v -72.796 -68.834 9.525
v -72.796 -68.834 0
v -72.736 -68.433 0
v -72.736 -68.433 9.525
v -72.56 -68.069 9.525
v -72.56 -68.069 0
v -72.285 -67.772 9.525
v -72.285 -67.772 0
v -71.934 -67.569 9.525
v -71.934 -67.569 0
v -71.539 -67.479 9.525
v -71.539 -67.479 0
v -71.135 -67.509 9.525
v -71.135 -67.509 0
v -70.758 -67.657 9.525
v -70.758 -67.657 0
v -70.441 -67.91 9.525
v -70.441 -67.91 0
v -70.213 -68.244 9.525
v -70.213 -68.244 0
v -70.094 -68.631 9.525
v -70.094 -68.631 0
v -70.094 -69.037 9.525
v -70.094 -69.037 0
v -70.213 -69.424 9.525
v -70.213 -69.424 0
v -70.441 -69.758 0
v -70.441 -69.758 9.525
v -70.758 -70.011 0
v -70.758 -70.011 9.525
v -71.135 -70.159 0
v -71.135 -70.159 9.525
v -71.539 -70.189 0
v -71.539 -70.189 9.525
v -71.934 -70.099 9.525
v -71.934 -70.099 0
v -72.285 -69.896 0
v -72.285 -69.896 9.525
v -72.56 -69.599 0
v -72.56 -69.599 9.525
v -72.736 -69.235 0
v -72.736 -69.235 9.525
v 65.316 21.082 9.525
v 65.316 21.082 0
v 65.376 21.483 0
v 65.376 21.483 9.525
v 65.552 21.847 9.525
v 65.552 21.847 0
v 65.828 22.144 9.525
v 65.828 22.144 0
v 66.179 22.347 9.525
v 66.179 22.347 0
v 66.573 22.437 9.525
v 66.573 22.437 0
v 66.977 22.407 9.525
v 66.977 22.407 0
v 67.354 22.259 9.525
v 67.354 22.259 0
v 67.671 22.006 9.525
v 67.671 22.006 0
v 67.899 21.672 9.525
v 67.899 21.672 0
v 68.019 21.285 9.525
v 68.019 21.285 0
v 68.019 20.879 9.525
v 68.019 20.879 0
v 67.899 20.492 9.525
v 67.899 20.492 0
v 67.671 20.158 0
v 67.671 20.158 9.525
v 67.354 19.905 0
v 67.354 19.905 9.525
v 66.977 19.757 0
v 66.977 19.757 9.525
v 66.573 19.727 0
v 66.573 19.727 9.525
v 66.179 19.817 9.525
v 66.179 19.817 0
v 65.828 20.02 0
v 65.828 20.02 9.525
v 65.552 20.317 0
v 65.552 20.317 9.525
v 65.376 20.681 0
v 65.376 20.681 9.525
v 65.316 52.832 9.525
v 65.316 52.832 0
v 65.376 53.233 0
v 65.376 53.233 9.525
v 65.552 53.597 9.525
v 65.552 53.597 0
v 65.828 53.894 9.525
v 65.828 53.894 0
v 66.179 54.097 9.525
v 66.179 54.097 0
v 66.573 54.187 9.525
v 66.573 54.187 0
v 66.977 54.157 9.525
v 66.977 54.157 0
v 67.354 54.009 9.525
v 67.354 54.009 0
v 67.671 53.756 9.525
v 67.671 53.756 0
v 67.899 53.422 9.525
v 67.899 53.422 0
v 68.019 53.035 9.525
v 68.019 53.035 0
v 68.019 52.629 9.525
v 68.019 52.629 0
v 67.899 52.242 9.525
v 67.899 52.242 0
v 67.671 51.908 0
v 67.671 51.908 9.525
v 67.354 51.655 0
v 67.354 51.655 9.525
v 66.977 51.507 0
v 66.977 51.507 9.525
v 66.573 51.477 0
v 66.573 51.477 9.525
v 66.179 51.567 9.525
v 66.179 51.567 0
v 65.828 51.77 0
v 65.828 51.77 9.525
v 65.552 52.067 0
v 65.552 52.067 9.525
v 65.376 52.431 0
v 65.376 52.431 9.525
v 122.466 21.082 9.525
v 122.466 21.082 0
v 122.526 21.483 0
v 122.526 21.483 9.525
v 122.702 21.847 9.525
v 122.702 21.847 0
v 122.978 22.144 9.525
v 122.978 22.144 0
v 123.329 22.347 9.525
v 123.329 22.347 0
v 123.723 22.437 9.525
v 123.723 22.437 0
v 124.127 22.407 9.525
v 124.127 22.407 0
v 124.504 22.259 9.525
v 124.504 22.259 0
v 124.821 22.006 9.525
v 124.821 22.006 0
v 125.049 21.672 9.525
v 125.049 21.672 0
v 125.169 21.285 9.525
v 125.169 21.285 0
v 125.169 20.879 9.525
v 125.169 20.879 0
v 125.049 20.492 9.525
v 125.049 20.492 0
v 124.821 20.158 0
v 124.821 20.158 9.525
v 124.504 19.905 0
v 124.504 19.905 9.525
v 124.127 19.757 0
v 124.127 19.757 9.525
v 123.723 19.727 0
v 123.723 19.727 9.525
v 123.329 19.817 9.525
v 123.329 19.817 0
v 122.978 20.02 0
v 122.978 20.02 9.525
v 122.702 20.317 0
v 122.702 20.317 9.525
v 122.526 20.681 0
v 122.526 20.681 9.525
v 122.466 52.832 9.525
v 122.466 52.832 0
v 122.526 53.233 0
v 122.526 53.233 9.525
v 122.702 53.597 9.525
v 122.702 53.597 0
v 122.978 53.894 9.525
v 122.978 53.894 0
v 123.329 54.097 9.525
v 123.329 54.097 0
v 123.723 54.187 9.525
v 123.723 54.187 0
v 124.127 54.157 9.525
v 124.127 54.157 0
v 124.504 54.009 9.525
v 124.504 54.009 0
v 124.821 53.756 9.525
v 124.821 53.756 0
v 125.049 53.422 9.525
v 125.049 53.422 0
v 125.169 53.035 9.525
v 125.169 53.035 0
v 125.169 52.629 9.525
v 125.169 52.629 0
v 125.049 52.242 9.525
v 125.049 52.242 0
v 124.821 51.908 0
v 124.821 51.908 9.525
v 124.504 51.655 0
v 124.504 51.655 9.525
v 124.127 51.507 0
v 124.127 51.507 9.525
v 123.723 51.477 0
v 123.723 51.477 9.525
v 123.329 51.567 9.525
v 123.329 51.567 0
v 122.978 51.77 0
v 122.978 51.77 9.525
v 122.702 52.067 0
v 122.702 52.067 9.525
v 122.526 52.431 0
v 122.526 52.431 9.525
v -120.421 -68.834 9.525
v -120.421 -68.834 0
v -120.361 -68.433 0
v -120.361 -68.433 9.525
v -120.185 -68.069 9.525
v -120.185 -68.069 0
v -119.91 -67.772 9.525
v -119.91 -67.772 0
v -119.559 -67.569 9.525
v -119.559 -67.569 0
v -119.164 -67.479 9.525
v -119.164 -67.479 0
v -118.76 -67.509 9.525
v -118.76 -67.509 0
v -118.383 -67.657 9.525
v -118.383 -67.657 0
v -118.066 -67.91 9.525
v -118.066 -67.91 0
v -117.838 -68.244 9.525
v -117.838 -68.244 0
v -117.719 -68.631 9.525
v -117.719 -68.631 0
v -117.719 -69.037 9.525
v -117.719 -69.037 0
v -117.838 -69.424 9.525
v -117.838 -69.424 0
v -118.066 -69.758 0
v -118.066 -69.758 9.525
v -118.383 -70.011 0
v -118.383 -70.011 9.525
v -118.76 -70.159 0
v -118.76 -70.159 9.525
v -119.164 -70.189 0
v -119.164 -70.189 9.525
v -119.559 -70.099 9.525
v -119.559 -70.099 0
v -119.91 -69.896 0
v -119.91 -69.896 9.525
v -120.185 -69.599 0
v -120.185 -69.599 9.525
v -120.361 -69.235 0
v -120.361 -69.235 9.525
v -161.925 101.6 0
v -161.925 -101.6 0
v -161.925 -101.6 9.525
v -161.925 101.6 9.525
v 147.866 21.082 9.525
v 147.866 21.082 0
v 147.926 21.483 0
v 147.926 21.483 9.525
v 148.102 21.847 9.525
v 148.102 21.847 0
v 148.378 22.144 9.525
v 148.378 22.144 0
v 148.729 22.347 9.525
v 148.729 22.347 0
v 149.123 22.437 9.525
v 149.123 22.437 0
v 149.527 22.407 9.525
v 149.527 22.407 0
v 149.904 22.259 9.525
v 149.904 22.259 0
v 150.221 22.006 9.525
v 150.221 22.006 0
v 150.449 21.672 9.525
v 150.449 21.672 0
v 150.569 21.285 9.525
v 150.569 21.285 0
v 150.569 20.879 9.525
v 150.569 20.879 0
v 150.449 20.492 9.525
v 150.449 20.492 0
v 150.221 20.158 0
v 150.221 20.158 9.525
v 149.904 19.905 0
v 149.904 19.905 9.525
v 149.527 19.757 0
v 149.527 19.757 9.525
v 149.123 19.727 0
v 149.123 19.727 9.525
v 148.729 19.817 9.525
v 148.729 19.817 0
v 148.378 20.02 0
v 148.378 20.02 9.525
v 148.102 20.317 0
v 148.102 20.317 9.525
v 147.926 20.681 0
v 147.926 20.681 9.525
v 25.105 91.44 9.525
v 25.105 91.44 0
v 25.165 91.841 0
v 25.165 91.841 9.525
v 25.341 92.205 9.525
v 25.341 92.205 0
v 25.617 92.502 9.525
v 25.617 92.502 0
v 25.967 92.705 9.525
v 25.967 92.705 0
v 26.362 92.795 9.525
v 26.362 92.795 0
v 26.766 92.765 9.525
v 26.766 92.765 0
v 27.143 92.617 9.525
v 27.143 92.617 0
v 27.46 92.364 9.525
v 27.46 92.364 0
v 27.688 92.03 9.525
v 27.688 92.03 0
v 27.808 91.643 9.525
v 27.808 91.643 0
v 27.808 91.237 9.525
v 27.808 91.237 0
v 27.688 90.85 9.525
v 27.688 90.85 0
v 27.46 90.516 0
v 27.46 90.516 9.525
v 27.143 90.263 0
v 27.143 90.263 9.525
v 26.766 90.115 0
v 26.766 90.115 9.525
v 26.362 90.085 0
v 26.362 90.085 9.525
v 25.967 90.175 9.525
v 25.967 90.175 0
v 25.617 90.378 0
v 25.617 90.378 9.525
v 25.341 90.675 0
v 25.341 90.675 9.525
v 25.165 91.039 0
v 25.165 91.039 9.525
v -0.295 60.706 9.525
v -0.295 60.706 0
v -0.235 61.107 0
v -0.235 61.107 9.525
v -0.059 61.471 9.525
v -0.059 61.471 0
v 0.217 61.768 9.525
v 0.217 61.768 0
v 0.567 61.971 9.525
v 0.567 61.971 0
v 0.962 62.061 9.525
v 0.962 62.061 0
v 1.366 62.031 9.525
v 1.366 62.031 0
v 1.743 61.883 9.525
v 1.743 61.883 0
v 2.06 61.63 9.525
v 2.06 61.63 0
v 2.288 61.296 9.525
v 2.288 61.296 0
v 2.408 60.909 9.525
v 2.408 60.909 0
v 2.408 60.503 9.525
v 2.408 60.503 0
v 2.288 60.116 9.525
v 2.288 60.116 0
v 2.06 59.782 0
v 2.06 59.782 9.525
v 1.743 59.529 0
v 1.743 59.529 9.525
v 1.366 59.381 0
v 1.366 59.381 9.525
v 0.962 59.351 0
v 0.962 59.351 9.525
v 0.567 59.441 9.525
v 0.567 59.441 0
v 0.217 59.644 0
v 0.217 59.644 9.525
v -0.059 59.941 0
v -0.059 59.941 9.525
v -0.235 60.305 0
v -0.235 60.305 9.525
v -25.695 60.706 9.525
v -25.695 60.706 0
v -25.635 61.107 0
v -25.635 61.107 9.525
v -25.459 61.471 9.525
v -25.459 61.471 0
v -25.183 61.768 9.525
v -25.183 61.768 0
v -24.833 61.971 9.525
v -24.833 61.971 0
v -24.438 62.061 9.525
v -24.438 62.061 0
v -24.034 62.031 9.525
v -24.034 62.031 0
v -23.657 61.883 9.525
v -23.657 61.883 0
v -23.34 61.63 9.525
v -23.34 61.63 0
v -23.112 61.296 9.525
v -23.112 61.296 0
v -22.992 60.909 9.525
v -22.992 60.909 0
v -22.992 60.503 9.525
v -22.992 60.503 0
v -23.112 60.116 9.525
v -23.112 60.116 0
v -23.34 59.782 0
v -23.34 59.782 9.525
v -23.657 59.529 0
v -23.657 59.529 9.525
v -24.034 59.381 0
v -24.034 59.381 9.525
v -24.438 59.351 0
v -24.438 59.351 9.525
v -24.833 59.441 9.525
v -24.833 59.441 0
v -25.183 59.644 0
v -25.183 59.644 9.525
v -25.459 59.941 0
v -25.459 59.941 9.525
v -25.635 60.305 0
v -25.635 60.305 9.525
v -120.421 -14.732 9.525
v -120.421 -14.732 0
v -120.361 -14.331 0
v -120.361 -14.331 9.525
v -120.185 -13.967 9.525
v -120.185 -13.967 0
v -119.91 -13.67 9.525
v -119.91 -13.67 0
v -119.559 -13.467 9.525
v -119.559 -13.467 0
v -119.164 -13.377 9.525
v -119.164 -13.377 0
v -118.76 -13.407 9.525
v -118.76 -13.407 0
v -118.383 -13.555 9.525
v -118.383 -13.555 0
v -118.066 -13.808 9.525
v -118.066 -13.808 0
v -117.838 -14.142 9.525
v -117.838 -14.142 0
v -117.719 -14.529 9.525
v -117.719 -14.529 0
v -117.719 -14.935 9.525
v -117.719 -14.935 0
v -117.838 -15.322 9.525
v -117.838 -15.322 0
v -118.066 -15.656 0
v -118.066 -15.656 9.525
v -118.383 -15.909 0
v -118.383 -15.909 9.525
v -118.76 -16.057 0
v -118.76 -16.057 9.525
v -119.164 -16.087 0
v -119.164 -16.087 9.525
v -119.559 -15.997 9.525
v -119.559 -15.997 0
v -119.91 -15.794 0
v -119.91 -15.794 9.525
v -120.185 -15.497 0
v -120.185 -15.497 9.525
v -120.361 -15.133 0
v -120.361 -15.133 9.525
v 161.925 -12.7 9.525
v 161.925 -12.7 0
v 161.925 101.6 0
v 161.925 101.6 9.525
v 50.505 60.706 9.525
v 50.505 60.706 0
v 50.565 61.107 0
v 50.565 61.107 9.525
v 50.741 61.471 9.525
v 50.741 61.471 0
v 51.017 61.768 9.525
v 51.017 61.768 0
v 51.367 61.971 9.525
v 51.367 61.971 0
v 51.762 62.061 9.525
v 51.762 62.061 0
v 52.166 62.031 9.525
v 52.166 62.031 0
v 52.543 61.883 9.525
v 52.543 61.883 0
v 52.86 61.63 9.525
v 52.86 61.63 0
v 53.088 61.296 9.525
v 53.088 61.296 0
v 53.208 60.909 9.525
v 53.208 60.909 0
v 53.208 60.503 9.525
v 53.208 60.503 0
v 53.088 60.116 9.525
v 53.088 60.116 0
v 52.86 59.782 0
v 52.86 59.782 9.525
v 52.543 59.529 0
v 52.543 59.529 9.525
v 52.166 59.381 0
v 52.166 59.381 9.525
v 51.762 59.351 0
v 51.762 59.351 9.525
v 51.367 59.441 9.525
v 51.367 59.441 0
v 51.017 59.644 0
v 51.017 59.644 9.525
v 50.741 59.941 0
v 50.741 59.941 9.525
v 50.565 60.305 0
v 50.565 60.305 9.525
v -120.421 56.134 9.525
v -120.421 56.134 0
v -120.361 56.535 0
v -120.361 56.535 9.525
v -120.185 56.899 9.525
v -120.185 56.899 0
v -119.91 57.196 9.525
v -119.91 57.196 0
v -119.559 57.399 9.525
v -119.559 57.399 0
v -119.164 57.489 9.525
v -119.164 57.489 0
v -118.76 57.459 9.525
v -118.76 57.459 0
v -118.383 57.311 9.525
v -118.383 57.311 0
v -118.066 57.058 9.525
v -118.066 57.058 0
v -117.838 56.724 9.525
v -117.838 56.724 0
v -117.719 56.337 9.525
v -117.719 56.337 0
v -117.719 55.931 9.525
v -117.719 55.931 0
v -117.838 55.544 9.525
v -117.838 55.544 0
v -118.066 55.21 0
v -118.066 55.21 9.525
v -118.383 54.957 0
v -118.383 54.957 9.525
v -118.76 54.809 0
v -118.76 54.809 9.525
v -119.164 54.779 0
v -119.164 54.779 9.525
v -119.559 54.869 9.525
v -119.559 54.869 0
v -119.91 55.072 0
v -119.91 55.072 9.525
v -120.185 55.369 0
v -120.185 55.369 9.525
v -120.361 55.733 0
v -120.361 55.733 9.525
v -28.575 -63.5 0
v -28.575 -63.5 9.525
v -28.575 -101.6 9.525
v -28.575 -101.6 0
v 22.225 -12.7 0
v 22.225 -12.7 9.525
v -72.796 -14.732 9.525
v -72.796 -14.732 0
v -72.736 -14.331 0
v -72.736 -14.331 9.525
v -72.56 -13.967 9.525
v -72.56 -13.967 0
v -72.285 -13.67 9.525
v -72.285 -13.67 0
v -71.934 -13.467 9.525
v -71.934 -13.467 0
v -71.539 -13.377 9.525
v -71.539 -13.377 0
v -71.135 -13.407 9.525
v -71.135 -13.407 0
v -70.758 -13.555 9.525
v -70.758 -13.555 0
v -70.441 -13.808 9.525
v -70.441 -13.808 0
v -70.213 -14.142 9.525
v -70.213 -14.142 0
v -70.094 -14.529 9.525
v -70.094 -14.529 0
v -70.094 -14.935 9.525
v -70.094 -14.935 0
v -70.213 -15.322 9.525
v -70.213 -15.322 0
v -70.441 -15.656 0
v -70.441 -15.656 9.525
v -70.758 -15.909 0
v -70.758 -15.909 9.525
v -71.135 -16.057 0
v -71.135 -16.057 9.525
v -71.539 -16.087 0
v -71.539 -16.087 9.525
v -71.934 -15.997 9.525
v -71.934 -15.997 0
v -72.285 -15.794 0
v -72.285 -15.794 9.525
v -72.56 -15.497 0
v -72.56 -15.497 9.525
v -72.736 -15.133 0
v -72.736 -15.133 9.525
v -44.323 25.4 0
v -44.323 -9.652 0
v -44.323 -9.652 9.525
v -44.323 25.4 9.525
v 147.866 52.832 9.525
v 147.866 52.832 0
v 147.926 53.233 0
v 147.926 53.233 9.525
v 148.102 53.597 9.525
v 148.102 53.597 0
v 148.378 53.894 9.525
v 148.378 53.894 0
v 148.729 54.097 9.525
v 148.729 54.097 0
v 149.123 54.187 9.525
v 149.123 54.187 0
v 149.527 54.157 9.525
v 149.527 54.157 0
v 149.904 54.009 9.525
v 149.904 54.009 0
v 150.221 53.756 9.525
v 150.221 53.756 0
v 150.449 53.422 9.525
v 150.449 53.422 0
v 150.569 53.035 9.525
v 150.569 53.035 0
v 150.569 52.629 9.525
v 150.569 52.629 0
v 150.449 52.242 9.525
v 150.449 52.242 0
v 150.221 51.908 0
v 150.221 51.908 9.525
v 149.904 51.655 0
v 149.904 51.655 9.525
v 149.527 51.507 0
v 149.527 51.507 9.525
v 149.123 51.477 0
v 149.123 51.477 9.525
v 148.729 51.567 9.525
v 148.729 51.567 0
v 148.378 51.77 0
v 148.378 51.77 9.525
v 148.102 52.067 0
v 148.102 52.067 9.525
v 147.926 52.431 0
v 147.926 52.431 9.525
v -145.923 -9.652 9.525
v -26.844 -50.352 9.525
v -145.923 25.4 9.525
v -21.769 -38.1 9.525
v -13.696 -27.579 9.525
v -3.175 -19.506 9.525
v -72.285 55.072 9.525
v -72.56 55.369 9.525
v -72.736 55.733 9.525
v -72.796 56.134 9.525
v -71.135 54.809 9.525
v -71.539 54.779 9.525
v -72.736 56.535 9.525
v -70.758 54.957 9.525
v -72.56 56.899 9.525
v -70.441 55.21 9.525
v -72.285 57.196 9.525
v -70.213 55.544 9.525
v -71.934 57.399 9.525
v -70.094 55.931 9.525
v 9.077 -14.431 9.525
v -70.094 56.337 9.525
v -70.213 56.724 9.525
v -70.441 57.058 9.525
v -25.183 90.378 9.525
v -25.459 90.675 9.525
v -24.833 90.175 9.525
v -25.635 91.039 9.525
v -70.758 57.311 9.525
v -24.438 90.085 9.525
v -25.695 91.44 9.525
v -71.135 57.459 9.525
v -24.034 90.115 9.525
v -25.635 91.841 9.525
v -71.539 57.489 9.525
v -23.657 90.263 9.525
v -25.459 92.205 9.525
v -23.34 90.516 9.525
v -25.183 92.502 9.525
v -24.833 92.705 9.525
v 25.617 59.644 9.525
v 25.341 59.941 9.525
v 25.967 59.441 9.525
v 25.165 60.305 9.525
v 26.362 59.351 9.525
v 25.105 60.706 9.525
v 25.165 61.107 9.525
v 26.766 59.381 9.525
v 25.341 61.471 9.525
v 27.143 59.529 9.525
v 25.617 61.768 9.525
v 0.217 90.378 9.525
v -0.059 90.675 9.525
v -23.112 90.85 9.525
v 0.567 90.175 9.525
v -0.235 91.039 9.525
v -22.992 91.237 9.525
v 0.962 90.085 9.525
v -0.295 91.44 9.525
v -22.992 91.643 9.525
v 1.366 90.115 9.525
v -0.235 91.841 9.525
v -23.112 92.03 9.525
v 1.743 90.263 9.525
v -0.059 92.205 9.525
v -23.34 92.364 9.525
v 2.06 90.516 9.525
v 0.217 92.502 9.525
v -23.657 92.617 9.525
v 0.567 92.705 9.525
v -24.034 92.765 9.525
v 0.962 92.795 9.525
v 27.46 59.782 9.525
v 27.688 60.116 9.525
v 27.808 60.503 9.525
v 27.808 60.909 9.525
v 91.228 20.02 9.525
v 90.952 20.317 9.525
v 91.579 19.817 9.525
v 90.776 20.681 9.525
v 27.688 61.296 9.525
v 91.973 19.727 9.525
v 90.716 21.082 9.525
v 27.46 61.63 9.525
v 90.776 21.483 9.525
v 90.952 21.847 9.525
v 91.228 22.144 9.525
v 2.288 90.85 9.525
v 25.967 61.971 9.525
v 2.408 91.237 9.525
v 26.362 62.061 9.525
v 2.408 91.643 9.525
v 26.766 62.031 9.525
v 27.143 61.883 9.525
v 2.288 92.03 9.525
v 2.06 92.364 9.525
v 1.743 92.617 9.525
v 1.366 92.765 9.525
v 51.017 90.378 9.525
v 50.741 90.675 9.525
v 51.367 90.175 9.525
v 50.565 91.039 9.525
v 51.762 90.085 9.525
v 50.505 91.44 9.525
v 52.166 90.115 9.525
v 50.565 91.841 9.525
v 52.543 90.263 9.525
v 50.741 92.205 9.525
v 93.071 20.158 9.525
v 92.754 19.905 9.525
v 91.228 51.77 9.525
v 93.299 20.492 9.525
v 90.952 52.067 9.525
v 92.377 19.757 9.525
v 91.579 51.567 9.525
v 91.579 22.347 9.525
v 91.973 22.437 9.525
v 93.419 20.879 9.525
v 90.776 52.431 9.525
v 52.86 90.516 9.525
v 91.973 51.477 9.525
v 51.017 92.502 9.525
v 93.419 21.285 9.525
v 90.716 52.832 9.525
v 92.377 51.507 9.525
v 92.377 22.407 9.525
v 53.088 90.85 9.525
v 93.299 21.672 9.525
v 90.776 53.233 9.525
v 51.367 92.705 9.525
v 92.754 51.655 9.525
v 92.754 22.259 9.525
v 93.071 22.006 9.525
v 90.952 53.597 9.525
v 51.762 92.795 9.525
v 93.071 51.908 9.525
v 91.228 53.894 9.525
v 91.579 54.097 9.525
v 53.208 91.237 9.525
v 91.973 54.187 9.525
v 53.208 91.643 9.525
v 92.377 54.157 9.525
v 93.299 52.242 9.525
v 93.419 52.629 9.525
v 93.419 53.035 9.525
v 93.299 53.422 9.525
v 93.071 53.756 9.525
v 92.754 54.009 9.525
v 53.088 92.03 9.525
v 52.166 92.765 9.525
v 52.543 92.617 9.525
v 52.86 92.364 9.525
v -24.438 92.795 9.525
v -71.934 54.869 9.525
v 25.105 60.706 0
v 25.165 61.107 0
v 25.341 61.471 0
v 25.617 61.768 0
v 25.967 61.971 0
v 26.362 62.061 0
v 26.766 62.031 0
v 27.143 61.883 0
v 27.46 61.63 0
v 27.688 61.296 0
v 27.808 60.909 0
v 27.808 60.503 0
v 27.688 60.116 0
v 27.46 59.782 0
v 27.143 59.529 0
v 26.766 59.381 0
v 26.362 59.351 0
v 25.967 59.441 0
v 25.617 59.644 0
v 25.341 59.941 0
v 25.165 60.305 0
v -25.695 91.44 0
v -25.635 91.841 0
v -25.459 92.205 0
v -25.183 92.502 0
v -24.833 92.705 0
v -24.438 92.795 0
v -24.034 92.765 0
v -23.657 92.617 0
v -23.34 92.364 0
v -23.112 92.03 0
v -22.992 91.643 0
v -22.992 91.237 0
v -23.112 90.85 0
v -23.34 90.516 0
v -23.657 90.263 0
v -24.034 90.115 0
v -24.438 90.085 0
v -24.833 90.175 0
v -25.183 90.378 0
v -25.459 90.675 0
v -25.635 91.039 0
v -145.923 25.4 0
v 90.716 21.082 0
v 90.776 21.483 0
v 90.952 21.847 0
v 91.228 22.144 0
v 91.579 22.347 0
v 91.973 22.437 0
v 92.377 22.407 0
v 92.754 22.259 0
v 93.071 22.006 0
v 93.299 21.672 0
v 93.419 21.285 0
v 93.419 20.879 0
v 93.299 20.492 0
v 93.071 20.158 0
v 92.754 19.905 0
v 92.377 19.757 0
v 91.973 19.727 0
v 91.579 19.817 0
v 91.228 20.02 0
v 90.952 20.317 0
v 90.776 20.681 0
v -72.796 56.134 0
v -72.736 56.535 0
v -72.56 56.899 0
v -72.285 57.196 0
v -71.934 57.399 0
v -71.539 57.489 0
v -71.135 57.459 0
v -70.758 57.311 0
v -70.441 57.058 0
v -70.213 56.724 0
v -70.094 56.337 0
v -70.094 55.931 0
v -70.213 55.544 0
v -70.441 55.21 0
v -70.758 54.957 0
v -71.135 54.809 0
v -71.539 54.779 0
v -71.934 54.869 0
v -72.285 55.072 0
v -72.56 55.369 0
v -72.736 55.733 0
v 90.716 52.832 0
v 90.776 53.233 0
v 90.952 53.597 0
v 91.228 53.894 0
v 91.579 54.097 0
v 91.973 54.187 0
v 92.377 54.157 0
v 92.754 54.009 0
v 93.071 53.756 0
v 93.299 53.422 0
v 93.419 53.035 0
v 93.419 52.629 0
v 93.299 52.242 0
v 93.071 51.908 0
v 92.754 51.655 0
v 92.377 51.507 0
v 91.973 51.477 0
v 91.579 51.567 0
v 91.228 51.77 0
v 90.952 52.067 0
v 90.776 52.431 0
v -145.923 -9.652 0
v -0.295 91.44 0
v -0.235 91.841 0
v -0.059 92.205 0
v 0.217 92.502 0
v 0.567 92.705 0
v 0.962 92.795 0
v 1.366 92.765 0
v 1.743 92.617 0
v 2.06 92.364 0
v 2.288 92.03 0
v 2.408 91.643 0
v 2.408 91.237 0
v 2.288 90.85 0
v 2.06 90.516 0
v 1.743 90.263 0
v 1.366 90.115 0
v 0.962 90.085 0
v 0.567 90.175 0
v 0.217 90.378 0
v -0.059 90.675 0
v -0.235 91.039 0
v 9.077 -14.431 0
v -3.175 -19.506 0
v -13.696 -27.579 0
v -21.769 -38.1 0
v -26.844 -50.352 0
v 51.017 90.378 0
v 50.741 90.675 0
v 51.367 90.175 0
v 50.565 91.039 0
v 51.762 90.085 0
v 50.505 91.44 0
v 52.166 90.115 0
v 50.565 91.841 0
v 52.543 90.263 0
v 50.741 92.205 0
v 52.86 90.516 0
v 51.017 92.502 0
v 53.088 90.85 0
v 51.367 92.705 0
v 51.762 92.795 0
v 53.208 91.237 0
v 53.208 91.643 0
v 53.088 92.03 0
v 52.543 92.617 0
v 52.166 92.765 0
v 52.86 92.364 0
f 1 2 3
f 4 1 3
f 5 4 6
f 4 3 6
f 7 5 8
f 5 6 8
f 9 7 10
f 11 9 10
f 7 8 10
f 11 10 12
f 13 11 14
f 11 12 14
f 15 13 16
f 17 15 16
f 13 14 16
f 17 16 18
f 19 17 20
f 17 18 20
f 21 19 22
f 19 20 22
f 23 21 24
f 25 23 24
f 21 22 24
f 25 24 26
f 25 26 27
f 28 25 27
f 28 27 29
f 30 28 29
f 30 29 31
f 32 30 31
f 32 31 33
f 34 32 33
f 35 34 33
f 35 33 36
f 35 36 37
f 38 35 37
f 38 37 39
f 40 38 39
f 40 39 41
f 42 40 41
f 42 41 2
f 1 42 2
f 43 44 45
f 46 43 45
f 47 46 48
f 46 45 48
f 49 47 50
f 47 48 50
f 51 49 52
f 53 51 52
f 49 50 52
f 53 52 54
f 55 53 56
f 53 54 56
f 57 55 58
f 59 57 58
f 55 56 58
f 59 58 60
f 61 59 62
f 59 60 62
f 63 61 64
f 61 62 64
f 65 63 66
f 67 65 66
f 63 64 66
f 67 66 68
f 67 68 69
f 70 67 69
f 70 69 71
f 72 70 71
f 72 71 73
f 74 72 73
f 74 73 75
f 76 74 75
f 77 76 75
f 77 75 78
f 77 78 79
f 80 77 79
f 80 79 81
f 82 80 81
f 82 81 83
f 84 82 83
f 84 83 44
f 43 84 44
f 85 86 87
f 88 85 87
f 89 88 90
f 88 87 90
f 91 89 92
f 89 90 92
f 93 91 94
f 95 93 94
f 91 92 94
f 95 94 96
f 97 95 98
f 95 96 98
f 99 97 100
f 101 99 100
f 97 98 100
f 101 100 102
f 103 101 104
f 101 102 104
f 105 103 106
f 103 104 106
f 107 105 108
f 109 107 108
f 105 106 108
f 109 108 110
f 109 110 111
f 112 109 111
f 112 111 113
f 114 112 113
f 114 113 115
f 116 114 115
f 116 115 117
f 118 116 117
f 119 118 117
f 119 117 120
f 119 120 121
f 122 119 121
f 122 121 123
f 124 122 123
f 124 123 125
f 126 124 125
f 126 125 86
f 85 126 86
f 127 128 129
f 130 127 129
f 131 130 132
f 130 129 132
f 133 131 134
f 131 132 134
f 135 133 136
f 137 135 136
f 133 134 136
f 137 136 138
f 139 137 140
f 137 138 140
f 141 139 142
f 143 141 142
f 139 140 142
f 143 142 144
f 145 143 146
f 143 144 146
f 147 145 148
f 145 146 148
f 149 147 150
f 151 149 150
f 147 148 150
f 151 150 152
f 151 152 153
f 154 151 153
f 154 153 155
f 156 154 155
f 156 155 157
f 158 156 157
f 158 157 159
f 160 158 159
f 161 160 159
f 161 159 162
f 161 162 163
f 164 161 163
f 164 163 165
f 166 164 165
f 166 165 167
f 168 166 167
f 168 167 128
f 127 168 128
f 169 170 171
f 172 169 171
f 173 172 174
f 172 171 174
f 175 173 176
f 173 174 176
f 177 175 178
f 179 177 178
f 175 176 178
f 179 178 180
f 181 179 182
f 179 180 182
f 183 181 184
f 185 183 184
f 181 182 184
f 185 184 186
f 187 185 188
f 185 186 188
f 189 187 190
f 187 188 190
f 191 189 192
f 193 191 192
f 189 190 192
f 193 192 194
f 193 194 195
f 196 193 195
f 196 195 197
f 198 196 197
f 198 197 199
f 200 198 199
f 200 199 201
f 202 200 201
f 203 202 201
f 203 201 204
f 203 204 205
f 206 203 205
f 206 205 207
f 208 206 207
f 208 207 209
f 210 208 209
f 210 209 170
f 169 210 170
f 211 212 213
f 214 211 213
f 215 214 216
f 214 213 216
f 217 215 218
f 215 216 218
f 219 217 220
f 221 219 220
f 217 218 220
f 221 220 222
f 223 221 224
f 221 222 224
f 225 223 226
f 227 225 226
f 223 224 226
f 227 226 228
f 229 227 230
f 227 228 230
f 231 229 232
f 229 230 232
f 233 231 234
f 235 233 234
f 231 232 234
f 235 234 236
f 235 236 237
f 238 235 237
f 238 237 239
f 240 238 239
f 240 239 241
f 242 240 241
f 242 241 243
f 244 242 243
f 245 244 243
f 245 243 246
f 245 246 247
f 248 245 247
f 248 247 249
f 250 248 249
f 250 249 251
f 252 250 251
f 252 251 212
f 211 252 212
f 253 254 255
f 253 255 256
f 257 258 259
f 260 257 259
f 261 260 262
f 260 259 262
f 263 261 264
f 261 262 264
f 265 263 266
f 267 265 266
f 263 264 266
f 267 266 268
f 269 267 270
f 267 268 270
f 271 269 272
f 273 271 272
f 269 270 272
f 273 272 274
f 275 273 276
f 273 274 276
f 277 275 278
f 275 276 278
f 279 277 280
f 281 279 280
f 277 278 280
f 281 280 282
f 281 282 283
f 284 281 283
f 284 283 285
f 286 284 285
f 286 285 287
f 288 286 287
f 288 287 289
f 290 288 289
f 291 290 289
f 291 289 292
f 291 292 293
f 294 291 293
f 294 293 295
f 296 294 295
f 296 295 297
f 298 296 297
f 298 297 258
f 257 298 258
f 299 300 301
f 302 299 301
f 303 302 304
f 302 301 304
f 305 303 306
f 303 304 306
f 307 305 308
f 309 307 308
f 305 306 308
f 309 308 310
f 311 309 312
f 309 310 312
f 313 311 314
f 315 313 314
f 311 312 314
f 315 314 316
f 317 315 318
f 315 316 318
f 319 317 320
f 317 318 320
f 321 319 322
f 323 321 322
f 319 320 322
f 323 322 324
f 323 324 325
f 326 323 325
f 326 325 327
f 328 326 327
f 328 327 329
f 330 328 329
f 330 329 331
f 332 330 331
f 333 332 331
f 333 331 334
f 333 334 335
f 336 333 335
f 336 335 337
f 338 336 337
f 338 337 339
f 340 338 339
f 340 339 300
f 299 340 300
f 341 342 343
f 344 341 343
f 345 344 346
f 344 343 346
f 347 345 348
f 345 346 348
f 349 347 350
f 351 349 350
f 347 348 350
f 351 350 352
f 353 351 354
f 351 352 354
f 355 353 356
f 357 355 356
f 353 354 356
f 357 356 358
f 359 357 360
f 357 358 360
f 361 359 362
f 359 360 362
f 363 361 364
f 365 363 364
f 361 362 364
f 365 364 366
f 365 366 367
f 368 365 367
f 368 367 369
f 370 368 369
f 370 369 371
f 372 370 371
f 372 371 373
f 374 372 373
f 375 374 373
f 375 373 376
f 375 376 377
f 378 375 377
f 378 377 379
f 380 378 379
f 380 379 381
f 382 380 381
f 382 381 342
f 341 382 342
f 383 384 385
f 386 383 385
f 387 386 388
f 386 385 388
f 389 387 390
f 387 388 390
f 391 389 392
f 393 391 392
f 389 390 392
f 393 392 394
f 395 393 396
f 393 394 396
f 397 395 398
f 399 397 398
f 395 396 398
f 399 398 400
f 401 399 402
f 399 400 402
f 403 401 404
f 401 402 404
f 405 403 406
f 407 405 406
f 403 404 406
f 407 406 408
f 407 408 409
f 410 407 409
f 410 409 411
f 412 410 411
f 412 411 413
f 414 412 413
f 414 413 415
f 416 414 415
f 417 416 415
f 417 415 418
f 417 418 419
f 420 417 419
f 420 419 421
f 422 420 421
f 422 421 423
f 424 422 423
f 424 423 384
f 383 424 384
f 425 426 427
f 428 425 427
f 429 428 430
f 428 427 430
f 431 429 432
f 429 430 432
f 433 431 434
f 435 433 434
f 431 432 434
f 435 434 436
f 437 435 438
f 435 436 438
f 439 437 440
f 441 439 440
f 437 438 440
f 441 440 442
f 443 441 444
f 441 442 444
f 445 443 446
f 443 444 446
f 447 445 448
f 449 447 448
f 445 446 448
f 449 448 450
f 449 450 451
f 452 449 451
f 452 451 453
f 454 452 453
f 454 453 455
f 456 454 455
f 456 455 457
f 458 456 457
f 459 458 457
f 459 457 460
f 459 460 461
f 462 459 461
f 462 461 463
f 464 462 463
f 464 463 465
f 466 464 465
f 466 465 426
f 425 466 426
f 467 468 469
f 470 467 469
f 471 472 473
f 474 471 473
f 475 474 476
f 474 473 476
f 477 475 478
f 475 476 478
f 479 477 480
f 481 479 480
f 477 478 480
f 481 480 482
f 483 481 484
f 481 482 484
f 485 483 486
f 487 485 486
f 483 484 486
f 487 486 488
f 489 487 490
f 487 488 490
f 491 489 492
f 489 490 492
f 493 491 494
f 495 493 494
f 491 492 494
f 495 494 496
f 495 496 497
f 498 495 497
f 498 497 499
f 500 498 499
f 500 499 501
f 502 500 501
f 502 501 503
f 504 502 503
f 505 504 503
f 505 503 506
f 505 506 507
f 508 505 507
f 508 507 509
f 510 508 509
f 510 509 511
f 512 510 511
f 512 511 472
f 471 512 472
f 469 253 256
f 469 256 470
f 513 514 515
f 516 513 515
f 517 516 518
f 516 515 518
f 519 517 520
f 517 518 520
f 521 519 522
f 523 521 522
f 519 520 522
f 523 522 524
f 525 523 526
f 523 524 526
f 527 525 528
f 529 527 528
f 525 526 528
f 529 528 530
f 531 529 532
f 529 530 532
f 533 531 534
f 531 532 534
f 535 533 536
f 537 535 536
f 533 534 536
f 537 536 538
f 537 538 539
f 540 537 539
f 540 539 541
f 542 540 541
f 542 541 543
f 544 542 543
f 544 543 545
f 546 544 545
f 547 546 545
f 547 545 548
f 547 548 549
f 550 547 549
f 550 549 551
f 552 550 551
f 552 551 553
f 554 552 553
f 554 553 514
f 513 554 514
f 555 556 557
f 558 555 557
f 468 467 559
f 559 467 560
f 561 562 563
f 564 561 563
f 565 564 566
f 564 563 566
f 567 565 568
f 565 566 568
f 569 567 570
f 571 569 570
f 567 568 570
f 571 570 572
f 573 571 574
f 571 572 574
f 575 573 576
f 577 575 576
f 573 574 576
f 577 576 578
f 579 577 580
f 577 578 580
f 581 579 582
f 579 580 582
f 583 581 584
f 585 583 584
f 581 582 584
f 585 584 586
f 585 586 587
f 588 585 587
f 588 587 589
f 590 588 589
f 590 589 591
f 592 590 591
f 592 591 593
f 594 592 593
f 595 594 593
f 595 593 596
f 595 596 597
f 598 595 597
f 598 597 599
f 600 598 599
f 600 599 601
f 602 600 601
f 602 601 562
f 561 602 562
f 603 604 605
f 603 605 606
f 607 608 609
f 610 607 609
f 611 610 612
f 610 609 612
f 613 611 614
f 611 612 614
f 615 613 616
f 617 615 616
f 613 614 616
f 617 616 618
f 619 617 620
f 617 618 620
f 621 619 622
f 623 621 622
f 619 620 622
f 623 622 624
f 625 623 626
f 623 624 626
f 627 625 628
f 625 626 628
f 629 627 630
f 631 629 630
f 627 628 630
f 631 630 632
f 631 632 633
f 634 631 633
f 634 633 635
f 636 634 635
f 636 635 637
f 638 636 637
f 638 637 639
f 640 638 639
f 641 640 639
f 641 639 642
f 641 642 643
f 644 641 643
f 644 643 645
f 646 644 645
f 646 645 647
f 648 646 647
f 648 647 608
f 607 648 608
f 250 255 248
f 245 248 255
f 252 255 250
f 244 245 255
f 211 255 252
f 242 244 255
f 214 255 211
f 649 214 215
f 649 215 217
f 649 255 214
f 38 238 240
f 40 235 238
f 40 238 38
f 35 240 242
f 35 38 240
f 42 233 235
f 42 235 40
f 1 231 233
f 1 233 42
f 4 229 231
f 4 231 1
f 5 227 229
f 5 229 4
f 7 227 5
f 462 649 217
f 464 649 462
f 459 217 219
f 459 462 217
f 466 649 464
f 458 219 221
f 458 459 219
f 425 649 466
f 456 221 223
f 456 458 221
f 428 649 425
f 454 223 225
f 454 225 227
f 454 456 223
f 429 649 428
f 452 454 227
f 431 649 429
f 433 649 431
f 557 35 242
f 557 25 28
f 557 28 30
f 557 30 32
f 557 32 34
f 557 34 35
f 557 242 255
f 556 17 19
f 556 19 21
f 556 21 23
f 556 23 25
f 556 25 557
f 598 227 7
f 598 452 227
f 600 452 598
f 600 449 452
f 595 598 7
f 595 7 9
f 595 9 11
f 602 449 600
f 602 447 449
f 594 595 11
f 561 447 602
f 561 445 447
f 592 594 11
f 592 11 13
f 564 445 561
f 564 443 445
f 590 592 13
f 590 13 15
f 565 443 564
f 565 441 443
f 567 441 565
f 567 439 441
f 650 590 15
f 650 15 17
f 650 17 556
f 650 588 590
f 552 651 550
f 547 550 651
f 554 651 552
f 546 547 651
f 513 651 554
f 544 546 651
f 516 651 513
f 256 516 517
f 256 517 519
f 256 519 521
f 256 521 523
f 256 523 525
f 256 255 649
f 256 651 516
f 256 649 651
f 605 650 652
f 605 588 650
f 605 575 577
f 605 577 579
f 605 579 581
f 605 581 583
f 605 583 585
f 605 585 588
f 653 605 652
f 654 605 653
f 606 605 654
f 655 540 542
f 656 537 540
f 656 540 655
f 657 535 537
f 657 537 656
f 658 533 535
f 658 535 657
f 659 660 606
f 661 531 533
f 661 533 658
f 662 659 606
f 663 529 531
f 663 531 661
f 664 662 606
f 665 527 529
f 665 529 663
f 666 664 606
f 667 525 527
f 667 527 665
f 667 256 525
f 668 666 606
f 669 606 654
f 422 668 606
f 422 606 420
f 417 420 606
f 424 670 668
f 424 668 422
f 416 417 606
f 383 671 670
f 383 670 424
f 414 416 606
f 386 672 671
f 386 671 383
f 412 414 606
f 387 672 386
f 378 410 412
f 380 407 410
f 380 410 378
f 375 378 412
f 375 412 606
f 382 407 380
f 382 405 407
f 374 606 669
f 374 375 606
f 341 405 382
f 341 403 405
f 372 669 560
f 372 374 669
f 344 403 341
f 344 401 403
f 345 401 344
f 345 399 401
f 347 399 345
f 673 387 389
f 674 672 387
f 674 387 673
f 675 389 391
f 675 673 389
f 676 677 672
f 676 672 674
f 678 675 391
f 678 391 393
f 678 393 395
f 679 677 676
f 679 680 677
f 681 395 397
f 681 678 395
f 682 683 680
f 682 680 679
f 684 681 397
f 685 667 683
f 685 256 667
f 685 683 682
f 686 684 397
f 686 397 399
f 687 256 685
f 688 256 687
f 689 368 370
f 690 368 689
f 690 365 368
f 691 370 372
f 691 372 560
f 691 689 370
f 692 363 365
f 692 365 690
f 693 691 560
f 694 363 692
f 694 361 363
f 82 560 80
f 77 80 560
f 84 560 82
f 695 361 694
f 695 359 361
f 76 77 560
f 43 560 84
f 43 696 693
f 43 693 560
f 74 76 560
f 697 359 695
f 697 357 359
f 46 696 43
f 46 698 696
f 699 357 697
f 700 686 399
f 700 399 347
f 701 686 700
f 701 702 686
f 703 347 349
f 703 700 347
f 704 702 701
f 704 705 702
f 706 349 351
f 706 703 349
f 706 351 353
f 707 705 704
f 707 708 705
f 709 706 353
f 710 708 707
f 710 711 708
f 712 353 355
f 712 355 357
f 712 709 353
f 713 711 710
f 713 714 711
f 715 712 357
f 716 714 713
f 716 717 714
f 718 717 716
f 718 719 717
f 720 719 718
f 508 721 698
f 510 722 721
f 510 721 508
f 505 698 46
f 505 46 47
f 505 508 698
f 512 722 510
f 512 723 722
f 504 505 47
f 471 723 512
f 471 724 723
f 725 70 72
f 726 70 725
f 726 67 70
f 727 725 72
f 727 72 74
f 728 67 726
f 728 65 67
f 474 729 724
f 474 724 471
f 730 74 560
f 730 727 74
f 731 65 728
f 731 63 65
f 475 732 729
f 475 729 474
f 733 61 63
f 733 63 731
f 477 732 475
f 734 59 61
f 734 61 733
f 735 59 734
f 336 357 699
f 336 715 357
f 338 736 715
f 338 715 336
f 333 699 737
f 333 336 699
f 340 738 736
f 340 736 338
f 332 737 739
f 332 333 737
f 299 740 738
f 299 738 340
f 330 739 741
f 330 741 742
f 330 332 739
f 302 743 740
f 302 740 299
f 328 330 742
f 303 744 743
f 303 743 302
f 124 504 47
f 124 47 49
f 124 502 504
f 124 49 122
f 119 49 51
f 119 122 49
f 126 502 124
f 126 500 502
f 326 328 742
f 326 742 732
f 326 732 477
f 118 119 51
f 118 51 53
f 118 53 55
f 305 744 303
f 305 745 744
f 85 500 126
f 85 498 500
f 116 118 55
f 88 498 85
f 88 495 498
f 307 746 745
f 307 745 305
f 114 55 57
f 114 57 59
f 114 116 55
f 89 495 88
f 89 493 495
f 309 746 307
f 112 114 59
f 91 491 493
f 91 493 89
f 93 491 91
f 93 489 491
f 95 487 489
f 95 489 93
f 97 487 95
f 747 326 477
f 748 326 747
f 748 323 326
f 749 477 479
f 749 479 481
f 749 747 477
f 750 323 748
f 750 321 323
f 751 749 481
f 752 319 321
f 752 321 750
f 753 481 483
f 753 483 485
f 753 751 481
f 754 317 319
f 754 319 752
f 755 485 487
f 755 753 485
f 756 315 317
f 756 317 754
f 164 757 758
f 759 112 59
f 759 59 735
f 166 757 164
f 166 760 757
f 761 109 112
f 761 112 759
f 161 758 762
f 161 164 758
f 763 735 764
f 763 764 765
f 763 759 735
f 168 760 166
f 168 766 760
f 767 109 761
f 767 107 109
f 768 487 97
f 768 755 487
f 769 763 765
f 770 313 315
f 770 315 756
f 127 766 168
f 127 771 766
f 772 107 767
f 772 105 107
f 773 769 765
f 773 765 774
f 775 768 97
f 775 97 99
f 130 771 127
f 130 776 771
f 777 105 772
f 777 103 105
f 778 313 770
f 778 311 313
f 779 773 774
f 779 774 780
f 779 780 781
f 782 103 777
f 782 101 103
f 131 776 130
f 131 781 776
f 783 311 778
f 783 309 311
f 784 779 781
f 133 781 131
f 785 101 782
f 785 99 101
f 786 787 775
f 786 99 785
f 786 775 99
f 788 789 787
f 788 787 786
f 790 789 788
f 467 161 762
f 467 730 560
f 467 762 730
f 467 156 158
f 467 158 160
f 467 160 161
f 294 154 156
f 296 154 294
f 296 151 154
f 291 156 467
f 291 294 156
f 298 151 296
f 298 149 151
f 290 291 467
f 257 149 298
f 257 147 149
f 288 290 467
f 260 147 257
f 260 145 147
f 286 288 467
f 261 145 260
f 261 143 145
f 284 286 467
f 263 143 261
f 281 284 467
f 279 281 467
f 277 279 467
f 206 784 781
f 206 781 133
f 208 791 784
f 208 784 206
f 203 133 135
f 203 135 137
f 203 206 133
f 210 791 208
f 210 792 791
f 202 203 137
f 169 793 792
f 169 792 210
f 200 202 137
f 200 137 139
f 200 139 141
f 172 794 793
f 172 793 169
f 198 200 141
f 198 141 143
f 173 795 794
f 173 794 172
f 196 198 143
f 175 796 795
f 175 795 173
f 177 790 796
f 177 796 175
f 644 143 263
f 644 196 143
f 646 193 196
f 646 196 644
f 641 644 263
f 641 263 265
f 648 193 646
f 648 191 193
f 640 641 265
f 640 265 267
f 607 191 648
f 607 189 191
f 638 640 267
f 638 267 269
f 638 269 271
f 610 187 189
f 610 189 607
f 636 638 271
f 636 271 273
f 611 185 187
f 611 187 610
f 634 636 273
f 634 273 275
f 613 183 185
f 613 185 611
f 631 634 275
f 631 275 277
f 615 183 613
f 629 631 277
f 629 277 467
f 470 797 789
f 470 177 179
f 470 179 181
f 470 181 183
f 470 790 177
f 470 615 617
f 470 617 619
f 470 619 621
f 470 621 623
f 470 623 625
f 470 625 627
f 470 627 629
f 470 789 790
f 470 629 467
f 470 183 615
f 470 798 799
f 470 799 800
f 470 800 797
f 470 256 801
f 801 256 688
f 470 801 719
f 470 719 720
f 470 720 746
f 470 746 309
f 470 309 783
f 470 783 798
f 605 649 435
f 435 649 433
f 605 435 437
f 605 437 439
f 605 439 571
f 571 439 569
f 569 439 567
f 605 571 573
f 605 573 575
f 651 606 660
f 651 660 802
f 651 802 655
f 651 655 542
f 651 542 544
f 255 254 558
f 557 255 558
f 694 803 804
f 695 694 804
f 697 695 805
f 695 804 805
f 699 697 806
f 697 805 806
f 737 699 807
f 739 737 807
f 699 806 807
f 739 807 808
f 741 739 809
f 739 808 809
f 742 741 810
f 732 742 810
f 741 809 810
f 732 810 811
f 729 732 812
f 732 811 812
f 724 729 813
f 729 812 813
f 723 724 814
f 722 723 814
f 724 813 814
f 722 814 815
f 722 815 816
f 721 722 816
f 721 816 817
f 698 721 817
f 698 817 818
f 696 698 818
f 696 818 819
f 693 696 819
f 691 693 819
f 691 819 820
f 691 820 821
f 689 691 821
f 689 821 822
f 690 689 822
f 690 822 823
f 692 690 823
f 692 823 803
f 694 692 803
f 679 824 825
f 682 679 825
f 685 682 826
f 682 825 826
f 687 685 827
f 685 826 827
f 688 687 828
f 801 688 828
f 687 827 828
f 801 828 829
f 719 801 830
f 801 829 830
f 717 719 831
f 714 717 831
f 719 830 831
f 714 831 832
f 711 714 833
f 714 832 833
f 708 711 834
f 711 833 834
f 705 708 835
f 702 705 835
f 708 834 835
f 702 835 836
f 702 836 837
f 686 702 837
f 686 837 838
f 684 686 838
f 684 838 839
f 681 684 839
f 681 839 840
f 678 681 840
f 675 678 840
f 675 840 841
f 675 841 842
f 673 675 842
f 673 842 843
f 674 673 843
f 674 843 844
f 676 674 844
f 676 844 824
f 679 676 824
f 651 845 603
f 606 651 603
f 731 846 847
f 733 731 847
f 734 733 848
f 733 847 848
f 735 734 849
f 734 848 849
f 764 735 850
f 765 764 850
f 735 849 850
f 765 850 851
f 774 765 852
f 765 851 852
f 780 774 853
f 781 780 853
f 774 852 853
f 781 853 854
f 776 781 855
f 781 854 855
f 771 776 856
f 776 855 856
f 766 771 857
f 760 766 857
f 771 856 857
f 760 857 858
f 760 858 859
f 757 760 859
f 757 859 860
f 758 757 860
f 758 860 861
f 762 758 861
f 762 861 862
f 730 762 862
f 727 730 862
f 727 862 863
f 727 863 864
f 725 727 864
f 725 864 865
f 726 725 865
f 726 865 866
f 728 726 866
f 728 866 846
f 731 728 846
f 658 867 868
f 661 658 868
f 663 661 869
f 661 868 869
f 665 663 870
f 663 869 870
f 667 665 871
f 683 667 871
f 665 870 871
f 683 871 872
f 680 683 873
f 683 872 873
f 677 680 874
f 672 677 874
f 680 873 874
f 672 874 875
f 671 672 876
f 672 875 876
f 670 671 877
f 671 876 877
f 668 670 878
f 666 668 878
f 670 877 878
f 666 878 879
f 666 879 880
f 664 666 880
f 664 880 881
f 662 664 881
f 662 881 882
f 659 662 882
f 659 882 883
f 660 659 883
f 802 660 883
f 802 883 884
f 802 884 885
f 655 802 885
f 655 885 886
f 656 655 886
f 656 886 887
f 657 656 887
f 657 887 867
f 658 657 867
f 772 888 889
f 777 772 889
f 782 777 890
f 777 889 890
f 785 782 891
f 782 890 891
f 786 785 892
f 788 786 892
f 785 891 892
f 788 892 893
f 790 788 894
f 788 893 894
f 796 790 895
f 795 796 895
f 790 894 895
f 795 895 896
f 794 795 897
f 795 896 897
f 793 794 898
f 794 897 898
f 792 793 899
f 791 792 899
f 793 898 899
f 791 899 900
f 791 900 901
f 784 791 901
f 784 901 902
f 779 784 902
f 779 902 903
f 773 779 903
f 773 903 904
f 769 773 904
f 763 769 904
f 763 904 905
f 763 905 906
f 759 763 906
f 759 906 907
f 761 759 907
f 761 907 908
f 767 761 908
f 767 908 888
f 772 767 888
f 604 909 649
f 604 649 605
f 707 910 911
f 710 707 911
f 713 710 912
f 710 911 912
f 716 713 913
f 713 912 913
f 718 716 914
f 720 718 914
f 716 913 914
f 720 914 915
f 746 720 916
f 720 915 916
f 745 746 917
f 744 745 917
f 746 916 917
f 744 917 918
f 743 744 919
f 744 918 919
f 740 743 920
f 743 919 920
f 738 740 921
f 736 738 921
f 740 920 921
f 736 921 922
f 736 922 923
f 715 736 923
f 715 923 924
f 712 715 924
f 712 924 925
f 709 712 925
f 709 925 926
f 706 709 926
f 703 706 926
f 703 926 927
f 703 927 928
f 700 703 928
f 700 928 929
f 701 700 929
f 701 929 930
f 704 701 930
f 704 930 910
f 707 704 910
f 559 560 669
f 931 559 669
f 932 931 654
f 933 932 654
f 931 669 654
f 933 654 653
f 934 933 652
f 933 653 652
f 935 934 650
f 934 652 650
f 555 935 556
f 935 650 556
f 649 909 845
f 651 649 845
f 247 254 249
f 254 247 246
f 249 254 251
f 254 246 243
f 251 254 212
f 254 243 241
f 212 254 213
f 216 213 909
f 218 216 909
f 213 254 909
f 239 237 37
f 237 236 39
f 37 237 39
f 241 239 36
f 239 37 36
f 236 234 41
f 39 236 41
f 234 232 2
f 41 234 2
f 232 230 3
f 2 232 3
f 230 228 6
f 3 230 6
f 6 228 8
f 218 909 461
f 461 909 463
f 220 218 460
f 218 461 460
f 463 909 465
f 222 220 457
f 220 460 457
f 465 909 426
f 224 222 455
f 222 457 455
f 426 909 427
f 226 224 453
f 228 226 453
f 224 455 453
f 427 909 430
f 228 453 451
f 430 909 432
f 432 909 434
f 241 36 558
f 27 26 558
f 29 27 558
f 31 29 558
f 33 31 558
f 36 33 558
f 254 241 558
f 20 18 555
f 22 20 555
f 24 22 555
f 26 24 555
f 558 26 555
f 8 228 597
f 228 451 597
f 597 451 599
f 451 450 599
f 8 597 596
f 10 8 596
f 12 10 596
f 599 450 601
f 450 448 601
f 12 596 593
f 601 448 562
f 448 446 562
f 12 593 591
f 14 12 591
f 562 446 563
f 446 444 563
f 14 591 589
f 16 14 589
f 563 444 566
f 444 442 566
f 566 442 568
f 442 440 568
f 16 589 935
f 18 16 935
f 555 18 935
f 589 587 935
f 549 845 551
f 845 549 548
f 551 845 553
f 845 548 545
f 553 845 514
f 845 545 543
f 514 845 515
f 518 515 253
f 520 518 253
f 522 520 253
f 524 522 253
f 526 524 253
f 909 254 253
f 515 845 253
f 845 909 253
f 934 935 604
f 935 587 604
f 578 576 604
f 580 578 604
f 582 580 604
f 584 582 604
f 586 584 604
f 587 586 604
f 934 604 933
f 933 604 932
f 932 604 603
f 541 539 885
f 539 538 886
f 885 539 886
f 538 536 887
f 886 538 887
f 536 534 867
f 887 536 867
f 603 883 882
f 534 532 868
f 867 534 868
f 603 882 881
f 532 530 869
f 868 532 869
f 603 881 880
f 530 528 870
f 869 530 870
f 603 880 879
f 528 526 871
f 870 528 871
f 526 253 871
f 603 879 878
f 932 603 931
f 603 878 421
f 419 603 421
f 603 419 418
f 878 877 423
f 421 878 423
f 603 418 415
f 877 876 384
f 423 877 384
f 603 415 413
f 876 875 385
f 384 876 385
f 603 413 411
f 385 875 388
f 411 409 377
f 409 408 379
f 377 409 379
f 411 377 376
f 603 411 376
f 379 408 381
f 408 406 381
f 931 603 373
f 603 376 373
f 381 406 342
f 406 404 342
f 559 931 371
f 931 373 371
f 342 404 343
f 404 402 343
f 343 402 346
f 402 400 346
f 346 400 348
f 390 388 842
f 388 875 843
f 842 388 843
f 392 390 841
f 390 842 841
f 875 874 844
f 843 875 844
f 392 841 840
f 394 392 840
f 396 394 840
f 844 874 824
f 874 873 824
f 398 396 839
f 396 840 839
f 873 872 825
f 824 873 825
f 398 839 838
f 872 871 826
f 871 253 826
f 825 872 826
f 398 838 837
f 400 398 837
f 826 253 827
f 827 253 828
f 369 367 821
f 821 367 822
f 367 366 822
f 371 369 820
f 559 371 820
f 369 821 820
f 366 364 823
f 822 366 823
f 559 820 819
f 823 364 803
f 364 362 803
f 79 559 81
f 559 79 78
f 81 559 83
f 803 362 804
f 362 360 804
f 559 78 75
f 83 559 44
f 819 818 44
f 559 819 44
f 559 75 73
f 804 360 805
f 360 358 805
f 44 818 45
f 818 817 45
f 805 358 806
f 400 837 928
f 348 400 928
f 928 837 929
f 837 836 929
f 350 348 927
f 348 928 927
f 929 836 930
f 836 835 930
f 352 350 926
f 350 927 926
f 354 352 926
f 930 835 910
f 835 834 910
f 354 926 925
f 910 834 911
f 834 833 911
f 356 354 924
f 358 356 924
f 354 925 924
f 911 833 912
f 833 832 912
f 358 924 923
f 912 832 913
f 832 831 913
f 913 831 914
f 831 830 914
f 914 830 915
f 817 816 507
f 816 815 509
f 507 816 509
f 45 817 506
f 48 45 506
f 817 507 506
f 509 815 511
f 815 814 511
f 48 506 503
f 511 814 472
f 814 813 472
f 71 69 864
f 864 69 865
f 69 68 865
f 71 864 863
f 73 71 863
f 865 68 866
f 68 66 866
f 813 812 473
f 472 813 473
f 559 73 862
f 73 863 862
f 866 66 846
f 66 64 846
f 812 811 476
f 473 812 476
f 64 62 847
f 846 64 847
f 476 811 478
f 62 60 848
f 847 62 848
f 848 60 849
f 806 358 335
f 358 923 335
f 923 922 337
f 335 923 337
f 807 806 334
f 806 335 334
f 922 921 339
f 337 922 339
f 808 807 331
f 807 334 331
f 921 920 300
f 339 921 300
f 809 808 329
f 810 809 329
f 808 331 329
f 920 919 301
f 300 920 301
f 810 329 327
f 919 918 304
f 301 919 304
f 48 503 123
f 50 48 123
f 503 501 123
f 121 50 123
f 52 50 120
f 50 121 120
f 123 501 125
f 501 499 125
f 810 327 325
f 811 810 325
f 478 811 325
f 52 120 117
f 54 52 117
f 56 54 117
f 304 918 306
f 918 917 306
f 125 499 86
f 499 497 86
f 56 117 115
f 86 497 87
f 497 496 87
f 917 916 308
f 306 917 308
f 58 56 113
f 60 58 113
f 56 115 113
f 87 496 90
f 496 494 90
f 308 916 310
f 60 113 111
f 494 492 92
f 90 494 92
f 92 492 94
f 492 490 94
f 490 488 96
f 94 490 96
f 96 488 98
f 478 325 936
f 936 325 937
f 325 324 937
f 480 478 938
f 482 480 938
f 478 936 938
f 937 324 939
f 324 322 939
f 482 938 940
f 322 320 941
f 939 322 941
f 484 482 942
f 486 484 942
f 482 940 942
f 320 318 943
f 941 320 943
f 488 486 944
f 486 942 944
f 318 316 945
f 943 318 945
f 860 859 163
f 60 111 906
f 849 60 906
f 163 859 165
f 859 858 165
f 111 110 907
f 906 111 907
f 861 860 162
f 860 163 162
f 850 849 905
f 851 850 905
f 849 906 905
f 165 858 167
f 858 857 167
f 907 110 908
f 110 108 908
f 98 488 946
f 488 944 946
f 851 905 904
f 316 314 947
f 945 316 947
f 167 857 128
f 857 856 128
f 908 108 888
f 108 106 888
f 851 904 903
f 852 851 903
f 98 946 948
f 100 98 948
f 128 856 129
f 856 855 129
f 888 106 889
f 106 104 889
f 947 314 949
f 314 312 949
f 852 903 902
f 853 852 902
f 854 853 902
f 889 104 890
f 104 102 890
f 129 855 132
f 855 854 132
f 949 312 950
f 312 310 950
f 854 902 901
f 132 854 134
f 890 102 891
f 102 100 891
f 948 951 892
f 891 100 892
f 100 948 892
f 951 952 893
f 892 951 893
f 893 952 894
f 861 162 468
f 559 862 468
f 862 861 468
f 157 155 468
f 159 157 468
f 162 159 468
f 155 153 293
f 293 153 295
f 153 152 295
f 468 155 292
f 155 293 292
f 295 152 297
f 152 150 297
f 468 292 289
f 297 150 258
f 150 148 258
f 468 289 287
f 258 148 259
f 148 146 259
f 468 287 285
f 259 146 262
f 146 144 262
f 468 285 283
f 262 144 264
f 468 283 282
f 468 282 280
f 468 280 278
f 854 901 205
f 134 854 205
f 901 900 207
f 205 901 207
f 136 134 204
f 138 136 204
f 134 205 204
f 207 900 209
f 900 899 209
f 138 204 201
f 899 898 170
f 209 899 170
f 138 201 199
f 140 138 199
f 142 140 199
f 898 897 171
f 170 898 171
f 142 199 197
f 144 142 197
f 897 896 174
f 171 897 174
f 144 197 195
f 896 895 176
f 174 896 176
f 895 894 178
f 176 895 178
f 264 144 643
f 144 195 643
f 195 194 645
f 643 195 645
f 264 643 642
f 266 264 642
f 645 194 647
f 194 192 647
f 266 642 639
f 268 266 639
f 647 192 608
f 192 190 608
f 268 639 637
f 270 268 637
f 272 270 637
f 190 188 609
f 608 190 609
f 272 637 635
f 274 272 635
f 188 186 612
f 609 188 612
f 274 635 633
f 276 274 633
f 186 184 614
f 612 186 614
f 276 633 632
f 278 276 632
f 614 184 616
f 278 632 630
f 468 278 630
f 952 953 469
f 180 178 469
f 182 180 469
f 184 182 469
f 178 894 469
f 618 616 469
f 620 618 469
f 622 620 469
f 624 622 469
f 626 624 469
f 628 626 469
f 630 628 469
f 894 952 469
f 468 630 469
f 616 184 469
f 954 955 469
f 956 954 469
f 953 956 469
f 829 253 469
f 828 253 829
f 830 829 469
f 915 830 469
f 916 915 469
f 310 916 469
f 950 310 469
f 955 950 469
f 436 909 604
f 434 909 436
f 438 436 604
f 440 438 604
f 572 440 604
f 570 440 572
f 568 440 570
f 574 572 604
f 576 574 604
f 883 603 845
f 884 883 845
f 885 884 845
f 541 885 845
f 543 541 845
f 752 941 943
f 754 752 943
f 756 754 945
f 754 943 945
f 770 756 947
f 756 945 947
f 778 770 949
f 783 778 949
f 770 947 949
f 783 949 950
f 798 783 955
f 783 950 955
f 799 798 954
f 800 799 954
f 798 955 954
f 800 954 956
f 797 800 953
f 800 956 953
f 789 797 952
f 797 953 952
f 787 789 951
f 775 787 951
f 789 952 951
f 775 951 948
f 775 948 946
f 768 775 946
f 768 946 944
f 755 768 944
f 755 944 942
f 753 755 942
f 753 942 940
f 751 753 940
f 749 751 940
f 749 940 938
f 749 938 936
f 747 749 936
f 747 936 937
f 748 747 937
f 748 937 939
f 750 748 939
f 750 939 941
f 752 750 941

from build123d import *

# Parameters (mm, degrees)
F0_W     = 323.85
F0_H     = 203.2
F0_W_2   = 101.6
F0_H_2   = 35.052
F1_DEPTH = 9.525
F3_D     = 2.7178
F5_DEPTH = 9.526


with BuildPart() as f1:
    # F0 (on Top) → F1 (new body)
    with BuildSketch(Plane.XY):
        Rectangle(F0_W, F0_H)
        with Locations((-95.123, 7.874)):
            Rectangle(F0_W_2, F0_H_2, mode=Mode.SUBTRACT)
    extrude(amount=F1_DEPTH)

    # F3 (through all)
    with Locations(Plane.XY.offset(9.525)):
        with Locations((-119.0625, 56.134), (-71.4375, 56.134), (-119.0625, -14.732), (-71.4375, -14.732), (-119.0625, -68.834), (-71.4375, -68.834), (-24.33604, 60.706), (-24.33604, 91.44), (1.06396, 91.44), (1.06396, 60.706), (26.46396, 60.706), (26.46396, 91.44), (51.86396, 91.44), (51.86396, 60.706), (66.675, 52.832), (66.675, 21.082), (92.075, 21.082), (92.075, 52.832), (123.825, 52.832), (123.825, 21.082), (92.075, 52.832), (149.225, 52.832), (149.225, 21.082)):
            Hole(F3_D / 2)

    # F4 (on face) → F5 (cut, through all)
    with BuildSketch(Plane.XY.offset(9.525)):
        with BuildLine():
            Line((161.925, -101.6), (161.925, -12.7))
            Line((161.925, -12.7), (22.225, -12.7))
            ThreePointArc((22.225, -12.7), (-13.696024, -27.578976), (-28.575, -63.5))
            Line((-28.575, -63.5), (-28.575, -101.6))
            Line((-28.575, -101.6), (161.925, -101.6))
        make_face()
    extrude(amount=-F5_DEPTH, mode=Mode.SUBTRACT)


solid = f1.part
